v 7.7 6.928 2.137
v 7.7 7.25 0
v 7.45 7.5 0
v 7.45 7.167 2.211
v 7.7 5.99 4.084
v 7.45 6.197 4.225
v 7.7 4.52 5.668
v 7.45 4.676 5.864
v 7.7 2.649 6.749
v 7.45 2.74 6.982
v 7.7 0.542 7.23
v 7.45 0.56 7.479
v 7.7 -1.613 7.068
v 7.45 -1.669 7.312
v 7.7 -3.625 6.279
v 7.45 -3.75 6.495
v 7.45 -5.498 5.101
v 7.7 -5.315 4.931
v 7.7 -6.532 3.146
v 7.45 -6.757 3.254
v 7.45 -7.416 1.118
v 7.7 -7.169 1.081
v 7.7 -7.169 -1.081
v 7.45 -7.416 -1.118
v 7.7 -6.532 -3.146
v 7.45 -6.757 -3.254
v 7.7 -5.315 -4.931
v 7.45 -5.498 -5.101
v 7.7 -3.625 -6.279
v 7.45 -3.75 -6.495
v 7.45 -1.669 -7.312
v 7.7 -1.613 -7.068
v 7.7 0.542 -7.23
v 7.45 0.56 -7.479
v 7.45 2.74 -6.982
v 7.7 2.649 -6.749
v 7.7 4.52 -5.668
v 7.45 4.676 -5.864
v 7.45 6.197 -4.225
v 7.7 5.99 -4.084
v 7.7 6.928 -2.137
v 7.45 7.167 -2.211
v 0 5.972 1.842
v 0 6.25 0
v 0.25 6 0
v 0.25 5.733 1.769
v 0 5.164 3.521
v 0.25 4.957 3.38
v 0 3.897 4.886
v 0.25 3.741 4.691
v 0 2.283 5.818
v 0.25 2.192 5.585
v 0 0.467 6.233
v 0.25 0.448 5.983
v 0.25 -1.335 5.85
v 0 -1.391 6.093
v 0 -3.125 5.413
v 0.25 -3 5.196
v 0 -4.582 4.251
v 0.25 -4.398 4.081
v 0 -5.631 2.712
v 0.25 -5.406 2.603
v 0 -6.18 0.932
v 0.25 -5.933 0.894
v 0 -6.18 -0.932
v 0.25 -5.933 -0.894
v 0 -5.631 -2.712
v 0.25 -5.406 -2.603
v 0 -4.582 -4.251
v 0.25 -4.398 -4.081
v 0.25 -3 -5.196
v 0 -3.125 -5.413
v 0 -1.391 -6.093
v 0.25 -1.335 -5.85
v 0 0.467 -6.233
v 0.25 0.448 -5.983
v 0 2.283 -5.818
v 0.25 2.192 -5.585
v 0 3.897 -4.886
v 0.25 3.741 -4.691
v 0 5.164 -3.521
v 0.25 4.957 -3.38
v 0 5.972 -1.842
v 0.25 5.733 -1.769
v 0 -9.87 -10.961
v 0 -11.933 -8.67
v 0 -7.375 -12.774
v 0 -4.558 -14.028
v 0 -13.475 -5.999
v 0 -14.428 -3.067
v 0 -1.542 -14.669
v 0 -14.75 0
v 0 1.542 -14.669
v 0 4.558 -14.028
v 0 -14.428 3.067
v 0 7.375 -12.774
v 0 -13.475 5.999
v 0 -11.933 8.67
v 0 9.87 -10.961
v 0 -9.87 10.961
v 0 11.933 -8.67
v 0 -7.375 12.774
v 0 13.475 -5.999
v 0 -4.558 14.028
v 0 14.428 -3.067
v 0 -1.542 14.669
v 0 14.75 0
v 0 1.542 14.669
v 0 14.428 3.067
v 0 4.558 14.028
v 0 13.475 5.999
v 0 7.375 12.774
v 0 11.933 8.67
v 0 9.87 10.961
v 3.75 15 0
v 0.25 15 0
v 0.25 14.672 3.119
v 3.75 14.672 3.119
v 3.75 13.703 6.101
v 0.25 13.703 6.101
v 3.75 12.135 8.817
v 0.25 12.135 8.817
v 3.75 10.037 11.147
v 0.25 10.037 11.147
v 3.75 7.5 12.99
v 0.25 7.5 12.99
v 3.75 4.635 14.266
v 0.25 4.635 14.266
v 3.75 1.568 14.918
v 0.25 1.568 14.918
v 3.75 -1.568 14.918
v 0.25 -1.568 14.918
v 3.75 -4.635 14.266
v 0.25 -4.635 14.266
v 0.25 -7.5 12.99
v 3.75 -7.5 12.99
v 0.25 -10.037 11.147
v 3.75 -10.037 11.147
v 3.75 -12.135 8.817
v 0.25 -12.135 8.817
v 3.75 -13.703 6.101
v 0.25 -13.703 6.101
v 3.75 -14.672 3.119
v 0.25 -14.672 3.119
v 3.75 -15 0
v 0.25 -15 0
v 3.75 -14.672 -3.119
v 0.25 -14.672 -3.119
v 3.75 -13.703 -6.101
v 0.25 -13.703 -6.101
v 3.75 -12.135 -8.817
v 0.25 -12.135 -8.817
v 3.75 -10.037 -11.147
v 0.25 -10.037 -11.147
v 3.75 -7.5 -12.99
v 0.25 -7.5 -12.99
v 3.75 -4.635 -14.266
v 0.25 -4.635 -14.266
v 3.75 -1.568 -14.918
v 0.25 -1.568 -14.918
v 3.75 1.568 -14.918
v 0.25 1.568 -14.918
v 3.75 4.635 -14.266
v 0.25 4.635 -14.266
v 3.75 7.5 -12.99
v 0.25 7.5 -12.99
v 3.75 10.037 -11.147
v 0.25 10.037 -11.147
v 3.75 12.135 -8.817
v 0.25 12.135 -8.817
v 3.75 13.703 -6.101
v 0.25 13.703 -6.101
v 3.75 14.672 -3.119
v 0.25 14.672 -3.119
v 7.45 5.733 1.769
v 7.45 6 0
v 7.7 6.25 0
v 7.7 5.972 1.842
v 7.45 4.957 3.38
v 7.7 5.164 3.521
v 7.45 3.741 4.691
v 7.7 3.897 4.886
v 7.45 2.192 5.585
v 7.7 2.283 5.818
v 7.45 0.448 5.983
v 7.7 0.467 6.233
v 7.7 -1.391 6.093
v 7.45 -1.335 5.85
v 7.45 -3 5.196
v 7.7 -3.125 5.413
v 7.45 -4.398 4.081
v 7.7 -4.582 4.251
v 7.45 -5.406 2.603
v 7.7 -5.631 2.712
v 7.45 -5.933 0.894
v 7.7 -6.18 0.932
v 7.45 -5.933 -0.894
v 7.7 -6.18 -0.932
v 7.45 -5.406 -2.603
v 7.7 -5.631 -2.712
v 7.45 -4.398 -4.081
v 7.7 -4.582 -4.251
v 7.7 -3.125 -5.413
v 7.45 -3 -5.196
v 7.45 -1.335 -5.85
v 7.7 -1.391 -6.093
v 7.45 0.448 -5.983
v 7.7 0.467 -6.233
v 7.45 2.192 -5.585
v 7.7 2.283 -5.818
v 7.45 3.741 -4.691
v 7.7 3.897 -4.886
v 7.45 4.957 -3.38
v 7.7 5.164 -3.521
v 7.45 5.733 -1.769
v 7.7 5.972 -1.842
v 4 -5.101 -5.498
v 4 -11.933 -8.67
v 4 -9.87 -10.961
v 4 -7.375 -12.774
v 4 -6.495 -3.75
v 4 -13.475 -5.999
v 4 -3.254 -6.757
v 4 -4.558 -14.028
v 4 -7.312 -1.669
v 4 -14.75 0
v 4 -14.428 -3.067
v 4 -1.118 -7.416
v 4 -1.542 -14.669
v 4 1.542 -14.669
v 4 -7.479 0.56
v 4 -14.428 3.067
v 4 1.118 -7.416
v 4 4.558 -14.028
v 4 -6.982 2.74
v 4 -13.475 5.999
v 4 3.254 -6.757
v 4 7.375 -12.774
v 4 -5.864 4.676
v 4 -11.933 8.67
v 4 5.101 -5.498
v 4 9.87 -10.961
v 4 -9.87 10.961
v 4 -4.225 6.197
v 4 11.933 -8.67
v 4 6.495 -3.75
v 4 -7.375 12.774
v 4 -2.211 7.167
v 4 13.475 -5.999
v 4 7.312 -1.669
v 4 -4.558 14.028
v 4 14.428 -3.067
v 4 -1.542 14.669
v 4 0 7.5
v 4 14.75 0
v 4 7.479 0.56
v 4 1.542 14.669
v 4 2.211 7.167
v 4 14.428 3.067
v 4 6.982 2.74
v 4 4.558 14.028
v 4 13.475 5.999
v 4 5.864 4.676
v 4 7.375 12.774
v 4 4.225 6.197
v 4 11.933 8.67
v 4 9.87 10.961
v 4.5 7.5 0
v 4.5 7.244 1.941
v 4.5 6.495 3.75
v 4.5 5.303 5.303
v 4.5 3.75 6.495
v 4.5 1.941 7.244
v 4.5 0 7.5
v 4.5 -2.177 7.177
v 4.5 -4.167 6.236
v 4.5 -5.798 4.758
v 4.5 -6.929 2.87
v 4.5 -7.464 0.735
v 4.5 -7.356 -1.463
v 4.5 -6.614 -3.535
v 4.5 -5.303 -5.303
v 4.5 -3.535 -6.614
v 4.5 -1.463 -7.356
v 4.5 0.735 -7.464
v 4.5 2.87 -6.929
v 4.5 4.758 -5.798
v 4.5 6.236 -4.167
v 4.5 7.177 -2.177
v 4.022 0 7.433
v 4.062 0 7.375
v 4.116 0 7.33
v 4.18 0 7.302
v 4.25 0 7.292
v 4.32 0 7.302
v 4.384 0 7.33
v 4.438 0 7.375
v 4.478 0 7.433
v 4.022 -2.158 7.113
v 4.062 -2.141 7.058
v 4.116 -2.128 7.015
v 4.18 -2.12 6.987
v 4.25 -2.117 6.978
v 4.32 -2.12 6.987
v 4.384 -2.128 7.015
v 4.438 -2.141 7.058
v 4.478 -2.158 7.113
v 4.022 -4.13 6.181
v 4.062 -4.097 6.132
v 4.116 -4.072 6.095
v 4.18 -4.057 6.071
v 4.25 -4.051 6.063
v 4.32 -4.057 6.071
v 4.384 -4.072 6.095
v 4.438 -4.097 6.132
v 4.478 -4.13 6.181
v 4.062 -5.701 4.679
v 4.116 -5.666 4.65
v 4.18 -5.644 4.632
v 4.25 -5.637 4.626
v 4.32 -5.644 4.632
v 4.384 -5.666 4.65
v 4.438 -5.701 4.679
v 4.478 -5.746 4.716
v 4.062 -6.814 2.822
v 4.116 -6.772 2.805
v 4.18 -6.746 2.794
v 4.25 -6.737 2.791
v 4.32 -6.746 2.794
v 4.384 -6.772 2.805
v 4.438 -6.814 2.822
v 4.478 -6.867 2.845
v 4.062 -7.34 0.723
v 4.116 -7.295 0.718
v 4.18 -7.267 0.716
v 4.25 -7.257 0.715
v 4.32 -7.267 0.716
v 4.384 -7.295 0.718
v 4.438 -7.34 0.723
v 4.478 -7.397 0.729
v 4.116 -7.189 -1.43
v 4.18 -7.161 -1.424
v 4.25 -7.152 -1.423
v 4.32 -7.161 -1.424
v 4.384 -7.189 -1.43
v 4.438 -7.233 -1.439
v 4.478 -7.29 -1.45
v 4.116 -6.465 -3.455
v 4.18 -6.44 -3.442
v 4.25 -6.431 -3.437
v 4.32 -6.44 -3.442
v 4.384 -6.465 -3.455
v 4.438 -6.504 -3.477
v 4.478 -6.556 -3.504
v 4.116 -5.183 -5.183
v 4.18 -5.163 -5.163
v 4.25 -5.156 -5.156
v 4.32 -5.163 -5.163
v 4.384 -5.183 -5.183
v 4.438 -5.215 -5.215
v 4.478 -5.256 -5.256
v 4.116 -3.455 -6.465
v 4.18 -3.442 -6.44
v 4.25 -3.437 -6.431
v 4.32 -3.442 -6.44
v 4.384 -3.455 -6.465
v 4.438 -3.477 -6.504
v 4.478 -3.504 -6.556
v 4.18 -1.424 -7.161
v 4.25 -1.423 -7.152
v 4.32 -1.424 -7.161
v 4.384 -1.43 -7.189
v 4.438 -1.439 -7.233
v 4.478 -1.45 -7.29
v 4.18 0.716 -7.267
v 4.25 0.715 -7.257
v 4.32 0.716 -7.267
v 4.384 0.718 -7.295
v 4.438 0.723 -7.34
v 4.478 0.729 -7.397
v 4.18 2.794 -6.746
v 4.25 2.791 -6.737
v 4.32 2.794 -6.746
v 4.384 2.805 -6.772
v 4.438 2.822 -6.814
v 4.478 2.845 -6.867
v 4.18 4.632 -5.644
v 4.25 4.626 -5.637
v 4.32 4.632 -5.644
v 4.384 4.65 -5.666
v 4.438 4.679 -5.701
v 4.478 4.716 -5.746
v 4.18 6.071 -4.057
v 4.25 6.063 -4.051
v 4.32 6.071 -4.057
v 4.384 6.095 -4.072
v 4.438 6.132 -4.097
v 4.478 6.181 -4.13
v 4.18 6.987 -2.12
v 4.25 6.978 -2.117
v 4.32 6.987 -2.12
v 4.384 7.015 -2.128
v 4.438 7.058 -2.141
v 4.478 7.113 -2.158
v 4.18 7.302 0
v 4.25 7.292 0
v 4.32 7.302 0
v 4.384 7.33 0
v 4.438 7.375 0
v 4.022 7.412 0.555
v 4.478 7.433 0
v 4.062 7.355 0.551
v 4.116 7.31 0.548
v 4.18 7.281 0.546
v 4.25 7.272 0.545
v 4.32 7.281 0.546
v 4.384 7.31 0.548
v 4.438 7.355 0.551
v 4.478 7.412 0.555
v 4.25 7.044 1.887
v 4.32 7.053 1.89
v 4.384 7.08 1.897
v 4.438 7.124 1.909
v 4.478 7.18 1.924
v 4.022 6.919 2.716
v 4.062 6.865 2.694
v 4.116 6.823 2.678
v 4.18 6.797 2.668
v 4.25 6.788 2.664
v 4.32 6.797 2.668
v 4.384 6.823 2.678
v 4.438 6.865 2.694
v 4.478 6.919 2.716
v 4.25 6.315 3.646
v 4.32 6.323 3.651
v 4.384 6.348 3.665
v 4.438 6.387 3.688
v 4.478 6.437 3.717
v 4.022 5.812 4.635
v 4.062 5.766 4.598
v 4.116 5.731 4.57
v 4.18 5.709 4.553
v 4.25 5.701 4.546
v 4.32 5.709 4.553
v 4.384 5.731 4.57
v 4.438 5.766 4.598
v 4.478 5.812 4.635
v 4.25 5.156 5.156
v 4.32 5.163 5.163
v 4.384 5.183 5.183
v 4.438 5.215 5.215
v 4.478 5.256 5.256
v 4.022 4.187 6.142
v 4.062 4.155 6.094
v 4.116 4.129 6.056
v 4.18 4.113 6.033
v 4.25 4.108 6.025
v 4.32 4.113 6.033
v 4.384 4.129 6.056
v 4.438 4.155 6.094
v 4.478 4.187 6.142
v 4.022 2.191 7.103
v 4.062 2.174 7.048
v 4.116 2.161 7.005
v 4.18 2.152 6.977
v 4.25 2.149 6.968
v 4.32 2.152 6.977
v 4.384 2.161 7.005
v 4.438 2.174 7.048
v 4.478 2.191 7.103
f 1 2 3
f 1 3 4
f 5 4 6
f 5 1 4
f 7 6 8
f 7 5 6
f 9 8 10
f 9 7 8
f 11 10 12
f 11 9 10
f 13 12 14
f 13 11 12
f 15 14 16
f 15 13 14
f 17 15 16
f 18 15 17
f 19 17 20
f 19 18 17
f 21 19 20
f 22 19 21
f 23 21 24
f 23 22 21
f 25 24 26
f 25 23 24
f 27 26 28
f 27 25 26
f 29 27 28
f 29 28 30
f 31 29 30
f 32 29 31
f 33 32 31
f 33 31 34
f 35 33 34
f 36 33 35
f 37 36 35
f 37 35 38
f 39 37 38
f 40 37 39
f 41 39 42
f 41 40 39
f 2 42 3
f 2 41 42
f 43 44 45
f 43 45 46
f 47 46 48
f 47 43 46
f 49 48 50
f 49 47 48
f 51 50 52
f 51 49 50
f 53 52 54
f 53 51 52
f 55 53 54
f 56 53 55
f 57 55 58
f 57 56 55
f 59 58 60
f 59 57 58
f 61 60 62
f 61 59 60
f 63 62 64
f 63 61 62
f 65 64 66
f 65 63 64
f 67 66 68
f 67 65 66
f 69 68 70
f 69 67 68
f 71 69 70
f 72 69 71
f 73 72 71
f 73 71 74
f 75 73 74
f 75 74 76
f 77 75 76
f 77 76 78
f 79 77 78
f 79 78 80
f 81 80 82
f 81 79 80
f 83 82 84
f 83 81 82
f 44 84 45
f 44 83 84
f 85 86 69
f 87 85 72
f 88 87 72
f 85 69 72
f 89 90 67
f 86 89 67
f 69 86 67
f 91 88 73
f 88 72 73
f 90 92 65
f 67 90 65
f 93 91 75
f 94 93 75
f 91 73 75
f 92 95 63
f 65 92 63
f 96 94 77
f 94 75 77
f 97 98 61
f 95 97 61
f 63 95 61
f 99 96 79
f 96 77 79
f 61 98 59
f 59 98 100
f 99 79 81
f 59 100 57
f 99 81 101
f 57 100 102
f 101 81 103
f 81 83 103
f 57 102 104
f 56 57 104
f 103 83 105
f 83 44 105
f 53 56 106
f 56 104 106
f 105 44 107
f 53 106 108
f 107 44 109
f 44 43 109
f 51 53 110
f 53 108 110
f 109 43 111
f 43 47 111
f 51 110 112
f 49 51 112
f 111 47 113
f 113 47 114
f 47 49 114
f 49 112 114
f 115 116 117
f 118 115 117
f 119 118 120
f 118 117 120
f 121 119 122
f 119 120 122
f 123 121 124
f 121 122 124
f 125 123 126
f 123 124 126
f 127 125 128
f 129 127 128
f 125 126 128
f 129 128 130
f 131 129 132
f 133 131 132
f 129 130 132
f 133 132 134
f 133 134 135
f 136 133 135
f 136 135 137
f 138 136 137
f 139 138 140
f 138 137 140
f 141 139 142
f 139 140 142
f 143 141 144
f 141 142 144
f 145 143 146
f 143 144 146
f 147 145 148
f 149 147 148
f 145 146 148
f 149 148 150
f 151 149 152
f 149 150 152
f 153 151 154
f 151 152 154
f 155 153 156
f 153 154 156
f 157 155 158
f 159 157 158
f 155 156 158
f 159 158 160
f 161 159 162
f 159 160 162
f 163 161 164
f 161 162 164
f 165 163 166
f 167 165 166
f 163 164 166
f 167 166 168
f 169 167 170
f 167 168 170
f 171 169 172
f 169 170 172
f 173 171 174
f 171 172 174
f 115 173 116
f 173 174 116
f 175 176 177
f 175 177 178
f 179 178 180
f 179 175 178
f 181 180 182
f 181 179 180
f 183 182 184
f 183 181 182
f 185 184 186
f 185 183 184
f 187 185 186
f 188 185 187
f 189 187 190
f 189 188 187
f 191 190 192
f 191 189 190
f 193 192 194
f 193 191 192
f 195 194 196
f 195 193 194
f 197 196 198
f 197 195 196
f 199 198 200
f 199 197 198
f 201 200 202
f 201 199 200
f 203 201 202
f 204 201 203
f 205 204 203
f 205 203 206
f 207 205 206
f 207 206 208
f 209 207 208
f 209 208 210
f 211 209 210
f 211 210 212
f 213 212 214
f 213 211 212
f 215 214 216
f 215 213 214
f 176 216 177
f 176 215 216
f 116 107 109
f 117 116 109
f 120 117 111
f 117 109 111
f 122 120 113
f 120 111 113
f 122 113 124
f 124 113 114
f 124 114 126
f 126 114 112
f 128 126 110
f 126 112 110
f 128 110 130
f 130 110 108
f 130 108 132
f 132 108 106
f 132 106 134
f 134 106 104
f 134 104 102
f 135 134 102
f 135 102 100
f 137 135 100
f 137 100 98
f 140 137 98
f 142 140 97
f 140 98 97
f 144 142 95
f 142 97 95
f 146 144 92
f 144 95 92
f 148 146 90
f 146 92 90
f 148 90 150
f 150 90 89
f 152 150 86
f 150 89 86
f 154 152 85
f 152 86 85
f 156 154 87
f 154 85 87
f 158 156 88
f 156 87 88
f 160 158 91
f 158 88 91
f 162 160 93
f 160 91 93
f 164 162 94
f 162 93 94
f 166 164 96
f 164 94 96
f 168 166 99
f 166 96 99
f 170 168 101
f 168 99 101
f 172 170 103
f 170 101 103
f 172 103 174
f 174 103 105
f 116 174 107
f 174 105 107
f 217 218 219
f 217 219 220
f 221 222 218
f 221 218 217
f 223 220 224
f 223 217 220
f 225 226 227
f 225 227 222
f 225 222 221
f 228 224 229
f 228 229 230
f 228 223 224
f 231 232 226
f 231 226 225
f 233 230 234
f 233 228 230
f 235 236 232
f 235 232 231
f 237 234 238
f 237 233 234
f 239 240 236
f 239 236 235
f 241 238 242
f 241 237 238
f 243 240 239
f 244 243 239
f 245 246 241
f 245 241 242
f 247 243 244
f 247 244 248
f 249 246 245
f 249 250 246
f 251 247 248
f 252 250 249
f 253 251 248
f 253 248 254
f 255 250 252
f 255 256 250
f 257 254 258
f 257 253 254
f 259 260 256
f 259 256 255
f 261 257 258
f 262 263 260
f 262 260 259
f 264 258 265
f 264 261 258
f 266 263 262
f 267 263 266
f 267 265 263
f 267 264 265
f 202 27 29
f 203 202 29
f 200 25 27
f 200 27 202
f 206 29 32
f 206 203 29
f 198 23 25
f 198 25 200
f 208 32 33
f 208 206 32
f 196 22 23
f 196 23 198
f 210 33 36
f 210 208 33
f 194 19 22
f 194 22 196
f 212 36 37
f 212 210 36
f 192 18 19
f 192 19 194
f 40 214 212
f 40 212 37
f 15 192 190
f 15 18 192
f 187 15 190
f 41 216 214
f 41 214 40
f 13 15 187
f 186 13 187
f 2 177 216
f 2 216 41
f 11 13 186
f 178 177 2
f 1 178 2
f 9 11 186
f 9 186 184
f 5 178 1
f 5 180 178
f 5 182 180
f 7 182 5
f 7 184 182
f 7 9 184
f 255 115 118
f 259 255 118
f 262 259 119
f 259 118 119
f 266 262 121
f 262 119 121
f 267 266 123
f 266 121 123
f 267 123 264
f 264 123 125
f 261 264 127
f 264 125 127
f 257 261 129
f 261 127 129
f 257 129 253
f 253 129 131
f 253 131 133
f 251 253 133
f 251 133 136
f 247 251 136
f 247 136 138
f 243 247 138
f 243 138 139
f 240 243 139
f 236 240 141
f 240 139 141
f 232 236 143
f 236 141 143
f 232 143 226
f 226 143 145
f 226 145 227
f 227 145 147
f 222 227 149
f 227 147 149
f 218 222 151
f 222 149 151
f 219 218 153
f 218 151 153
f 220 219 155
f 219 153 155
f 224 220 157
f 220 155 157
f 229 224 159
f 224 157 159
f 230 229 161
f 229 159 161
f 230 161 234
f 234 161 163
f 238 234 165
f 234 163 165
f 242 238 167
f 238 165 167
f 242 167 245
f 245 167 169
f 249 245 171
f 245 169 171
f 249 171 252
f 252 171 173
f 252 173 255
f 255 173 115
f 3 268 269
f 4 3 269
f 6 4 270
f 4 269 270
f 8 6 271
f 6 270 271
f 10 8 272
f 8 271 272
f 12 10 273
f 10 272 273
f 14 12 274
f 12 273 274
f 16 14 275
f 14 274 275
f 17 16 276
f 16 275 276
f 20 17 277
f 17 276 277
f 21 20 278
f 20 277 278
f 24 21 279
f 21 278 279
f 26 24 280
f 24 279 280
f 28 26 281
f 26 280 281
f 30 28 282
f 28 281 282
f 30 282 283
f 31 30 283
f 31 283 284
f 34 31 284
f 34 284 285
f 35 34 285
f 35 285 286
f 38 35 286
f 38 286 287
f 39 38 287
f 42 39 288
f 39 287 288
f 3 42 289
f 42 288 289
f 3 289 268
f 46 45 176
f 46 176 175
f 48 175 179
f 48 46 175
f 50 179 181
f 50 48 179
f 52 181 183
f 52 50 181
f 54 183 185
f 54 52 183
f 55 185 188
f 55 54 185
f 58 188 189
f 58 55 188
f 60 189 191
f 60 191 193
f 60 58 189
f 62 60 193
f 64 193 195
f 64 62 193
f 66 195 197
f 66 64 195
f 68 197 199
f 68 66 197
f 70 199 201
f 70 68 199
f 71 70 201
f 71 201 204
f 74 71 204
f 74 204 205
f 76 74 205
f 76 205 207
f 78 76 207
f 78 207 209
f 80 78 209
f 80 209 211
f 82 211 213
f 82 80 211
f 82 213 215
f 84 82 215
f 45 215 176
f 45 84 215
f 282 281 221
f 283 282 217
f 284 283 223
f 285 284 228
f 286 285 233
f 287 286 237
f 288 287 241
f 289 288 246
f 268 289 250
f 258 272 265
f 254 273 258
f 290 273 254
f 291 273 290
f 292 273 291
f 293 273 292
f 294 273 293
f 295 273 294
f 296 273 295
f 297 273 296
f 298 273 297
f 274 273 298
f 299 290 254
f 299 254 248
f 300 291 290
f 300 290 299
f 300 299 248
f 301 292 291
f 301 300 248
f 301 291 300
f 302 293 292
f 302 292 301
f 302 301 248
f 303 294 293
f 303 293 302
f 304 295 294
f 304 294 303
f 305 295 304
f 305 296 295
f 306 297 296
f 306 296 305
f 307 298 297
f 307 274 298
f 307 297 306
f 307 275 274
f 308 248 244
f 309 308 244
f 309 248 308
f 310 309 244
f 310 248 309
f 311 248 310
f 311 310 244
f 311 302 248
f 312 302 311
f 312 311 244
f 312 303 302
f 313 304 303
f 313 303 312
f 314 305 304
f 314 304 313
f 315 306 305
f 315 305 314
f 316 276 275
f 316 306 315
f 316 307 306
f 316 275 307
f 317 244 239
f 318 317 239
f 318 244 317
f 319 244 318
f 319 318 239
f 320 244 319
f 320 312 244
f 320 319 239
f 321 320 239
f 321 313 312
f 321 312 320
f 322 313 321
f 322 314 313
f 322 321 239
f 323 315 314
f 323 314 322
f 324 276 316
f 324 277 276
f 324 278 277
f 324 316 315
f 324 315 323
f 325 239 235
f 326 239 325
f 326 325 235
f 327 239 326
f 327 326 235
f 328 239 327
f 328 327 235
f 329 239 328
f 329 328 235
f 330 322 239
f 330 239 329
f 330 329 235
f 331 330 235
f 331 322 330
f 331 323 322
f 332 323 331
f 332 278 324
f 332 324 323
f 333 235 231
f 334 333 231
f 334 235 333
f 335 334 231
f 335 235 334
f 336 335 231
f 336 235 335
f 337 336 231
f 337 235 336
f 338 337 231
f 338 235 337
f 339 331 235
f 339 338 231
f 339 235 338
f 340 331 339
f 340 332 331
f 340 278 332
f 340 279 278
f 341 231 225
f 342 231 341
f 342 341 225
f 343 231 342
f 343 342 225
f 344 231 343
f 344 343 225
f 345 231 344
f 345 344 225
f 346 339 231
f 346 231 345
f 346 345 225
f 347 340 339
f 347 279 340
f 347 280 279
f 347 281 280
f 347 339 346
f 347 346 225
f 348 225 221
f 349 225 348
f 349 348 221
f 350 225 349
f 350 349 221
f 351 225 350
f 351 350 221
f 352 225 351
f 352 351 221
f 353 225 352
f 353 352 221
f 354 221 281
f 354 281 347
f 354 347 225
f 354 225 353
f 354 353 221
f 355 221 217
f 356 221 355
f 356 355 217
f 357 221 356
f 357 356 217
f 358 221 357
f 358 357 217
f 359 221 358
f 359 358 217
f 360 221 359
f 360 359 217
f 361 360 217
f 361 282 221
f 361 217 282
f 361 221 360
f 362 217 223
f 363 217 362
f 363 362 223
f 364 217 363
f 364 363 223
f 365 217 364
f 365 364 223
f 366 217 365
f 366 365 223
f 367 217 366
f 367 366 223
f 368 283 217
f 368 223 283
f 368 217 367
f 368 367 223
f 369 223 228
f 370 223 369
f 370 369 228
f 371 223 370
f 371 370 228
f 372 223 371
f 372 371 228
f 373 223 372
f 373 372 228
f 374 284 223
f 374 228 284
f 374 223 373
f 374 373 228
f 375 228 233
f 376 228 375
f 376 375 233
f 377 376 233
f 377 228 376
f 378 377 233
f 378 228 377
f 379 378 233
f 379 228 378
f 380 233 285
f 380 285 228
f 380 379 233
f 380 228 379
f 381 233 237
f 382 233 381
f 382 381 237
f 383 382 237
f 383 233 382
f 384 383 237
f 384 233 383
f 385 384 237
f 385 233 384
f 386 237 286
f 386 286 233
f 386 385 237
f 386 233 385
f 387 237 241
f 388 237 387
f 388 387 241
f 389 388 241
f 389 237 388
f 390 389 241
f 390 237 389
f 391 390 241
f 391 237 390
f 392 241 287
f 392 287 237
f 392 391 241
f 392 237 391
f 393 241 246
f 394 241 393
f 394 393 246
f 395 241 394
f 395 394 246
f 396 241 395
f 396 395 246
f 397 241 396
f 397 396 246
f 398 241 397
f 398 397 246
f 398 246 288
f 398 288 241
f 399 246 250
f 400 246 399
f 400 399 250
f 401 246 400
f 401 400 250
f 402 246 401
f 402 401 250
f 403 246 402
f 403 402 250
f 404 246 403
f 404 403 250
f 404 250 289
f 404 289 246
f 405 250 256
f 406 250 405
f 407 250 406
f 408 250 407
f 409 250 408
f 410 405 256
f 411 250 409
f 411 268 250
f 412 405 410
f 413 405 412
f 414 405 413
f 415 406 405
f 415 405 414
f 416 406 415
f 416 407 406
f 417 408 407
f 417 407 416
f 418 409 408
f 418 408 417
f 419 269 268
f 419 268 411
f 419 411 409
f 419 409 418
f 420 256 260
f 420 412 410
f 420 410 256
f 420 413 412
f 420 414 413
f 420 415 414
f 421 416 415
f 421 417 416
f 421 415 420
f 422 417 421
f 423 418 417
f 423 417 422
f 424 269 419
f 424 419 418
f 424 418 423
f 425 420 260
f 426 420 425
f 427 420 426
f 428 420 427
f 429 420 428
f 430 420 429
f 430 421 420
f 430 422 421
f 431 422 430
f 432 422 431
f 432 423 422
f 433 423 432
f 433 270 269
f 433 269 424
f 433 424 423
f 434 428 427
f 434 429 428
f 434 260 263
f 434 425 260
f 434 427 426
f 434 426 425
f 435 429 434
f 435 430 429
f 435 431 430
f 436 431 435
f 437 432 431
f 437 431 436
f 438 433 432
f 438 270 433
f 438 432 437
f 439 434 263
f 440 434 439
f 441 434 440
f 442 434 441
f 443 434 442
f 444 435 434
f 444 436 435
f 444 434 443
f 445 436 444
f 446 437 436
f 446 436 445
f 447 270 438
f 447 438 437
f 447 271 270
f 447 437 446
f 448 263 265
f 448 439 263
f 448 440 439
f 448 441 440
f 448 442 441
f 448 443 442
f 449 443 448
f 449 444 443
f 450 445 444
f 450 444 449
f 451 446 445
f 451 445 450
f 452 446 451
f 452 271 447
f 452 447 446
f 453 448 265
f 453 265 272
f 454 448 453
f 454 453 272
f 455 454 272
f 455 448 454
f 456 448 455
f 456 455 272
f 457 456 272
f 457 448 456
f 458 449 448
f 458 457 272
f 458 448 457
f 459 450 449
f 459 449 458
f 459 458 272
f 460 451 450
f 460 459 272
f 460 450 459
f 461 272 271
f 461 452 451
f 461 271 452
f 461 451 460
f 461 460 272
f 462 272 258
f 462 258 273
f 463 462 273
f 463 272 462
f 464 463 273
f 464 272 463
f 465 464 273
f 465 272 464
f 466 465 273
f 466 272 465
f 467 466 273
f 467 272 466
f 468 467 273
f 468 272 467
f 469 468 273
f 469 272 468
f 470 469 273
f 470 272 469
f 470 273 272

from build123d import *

# Parameters (mm, degrees)
F0_R     = 15
F0_R_2   = 7.5
F1_DEPTH = 4
F0_R_3   = 6
F2_DEPTH = 7.7
F3_SIZE  = 0.25


with BuildPart() as f1:
    # F0 (on Right) → F1 (new body)
    with BuildSketch(Plane.YZ):
        Circle(F0_R)
        Circle(F0_R_2, mode=Mode.SUBTRACT)
    extrude(amount=F1_DEPTH)

    # F0 (on Right) → F2 (join)
    with BuildSketch(Plane.YZ):
        Circle(F0_R_2)
        Circle(F0_R_3, mode=Mode.SUBTRACT)
    extrude(amount=F2_DEPTH)

    # F3
    f3_edges = [f1.edges().sort_by_distance(p)[0] for p in [
        (0, -15, 0),
        (0, -6, 0),
        (4, -15, 0),
        (7.7, -7.5, 0),
        (7.7, -6, 0),
    ]]
    chamfer(f3_edges, length=F3_SIZE)

    # F4 (on Front) → F5 (revolve, cut)
    with BuildSketch(Plane.XZ):
        with BuildLine():
            Line((4.5, 7.5), (4, 7.5))
            ThreePointArc((4, 7.5), (4.25, 7.291997), (4.5, 7.5))
        make_face()
    revolve(axis=Axis((2, 0, 0), (1, 0, 0)), mode=Mode.SUBTRACT)


solid = f1.part
